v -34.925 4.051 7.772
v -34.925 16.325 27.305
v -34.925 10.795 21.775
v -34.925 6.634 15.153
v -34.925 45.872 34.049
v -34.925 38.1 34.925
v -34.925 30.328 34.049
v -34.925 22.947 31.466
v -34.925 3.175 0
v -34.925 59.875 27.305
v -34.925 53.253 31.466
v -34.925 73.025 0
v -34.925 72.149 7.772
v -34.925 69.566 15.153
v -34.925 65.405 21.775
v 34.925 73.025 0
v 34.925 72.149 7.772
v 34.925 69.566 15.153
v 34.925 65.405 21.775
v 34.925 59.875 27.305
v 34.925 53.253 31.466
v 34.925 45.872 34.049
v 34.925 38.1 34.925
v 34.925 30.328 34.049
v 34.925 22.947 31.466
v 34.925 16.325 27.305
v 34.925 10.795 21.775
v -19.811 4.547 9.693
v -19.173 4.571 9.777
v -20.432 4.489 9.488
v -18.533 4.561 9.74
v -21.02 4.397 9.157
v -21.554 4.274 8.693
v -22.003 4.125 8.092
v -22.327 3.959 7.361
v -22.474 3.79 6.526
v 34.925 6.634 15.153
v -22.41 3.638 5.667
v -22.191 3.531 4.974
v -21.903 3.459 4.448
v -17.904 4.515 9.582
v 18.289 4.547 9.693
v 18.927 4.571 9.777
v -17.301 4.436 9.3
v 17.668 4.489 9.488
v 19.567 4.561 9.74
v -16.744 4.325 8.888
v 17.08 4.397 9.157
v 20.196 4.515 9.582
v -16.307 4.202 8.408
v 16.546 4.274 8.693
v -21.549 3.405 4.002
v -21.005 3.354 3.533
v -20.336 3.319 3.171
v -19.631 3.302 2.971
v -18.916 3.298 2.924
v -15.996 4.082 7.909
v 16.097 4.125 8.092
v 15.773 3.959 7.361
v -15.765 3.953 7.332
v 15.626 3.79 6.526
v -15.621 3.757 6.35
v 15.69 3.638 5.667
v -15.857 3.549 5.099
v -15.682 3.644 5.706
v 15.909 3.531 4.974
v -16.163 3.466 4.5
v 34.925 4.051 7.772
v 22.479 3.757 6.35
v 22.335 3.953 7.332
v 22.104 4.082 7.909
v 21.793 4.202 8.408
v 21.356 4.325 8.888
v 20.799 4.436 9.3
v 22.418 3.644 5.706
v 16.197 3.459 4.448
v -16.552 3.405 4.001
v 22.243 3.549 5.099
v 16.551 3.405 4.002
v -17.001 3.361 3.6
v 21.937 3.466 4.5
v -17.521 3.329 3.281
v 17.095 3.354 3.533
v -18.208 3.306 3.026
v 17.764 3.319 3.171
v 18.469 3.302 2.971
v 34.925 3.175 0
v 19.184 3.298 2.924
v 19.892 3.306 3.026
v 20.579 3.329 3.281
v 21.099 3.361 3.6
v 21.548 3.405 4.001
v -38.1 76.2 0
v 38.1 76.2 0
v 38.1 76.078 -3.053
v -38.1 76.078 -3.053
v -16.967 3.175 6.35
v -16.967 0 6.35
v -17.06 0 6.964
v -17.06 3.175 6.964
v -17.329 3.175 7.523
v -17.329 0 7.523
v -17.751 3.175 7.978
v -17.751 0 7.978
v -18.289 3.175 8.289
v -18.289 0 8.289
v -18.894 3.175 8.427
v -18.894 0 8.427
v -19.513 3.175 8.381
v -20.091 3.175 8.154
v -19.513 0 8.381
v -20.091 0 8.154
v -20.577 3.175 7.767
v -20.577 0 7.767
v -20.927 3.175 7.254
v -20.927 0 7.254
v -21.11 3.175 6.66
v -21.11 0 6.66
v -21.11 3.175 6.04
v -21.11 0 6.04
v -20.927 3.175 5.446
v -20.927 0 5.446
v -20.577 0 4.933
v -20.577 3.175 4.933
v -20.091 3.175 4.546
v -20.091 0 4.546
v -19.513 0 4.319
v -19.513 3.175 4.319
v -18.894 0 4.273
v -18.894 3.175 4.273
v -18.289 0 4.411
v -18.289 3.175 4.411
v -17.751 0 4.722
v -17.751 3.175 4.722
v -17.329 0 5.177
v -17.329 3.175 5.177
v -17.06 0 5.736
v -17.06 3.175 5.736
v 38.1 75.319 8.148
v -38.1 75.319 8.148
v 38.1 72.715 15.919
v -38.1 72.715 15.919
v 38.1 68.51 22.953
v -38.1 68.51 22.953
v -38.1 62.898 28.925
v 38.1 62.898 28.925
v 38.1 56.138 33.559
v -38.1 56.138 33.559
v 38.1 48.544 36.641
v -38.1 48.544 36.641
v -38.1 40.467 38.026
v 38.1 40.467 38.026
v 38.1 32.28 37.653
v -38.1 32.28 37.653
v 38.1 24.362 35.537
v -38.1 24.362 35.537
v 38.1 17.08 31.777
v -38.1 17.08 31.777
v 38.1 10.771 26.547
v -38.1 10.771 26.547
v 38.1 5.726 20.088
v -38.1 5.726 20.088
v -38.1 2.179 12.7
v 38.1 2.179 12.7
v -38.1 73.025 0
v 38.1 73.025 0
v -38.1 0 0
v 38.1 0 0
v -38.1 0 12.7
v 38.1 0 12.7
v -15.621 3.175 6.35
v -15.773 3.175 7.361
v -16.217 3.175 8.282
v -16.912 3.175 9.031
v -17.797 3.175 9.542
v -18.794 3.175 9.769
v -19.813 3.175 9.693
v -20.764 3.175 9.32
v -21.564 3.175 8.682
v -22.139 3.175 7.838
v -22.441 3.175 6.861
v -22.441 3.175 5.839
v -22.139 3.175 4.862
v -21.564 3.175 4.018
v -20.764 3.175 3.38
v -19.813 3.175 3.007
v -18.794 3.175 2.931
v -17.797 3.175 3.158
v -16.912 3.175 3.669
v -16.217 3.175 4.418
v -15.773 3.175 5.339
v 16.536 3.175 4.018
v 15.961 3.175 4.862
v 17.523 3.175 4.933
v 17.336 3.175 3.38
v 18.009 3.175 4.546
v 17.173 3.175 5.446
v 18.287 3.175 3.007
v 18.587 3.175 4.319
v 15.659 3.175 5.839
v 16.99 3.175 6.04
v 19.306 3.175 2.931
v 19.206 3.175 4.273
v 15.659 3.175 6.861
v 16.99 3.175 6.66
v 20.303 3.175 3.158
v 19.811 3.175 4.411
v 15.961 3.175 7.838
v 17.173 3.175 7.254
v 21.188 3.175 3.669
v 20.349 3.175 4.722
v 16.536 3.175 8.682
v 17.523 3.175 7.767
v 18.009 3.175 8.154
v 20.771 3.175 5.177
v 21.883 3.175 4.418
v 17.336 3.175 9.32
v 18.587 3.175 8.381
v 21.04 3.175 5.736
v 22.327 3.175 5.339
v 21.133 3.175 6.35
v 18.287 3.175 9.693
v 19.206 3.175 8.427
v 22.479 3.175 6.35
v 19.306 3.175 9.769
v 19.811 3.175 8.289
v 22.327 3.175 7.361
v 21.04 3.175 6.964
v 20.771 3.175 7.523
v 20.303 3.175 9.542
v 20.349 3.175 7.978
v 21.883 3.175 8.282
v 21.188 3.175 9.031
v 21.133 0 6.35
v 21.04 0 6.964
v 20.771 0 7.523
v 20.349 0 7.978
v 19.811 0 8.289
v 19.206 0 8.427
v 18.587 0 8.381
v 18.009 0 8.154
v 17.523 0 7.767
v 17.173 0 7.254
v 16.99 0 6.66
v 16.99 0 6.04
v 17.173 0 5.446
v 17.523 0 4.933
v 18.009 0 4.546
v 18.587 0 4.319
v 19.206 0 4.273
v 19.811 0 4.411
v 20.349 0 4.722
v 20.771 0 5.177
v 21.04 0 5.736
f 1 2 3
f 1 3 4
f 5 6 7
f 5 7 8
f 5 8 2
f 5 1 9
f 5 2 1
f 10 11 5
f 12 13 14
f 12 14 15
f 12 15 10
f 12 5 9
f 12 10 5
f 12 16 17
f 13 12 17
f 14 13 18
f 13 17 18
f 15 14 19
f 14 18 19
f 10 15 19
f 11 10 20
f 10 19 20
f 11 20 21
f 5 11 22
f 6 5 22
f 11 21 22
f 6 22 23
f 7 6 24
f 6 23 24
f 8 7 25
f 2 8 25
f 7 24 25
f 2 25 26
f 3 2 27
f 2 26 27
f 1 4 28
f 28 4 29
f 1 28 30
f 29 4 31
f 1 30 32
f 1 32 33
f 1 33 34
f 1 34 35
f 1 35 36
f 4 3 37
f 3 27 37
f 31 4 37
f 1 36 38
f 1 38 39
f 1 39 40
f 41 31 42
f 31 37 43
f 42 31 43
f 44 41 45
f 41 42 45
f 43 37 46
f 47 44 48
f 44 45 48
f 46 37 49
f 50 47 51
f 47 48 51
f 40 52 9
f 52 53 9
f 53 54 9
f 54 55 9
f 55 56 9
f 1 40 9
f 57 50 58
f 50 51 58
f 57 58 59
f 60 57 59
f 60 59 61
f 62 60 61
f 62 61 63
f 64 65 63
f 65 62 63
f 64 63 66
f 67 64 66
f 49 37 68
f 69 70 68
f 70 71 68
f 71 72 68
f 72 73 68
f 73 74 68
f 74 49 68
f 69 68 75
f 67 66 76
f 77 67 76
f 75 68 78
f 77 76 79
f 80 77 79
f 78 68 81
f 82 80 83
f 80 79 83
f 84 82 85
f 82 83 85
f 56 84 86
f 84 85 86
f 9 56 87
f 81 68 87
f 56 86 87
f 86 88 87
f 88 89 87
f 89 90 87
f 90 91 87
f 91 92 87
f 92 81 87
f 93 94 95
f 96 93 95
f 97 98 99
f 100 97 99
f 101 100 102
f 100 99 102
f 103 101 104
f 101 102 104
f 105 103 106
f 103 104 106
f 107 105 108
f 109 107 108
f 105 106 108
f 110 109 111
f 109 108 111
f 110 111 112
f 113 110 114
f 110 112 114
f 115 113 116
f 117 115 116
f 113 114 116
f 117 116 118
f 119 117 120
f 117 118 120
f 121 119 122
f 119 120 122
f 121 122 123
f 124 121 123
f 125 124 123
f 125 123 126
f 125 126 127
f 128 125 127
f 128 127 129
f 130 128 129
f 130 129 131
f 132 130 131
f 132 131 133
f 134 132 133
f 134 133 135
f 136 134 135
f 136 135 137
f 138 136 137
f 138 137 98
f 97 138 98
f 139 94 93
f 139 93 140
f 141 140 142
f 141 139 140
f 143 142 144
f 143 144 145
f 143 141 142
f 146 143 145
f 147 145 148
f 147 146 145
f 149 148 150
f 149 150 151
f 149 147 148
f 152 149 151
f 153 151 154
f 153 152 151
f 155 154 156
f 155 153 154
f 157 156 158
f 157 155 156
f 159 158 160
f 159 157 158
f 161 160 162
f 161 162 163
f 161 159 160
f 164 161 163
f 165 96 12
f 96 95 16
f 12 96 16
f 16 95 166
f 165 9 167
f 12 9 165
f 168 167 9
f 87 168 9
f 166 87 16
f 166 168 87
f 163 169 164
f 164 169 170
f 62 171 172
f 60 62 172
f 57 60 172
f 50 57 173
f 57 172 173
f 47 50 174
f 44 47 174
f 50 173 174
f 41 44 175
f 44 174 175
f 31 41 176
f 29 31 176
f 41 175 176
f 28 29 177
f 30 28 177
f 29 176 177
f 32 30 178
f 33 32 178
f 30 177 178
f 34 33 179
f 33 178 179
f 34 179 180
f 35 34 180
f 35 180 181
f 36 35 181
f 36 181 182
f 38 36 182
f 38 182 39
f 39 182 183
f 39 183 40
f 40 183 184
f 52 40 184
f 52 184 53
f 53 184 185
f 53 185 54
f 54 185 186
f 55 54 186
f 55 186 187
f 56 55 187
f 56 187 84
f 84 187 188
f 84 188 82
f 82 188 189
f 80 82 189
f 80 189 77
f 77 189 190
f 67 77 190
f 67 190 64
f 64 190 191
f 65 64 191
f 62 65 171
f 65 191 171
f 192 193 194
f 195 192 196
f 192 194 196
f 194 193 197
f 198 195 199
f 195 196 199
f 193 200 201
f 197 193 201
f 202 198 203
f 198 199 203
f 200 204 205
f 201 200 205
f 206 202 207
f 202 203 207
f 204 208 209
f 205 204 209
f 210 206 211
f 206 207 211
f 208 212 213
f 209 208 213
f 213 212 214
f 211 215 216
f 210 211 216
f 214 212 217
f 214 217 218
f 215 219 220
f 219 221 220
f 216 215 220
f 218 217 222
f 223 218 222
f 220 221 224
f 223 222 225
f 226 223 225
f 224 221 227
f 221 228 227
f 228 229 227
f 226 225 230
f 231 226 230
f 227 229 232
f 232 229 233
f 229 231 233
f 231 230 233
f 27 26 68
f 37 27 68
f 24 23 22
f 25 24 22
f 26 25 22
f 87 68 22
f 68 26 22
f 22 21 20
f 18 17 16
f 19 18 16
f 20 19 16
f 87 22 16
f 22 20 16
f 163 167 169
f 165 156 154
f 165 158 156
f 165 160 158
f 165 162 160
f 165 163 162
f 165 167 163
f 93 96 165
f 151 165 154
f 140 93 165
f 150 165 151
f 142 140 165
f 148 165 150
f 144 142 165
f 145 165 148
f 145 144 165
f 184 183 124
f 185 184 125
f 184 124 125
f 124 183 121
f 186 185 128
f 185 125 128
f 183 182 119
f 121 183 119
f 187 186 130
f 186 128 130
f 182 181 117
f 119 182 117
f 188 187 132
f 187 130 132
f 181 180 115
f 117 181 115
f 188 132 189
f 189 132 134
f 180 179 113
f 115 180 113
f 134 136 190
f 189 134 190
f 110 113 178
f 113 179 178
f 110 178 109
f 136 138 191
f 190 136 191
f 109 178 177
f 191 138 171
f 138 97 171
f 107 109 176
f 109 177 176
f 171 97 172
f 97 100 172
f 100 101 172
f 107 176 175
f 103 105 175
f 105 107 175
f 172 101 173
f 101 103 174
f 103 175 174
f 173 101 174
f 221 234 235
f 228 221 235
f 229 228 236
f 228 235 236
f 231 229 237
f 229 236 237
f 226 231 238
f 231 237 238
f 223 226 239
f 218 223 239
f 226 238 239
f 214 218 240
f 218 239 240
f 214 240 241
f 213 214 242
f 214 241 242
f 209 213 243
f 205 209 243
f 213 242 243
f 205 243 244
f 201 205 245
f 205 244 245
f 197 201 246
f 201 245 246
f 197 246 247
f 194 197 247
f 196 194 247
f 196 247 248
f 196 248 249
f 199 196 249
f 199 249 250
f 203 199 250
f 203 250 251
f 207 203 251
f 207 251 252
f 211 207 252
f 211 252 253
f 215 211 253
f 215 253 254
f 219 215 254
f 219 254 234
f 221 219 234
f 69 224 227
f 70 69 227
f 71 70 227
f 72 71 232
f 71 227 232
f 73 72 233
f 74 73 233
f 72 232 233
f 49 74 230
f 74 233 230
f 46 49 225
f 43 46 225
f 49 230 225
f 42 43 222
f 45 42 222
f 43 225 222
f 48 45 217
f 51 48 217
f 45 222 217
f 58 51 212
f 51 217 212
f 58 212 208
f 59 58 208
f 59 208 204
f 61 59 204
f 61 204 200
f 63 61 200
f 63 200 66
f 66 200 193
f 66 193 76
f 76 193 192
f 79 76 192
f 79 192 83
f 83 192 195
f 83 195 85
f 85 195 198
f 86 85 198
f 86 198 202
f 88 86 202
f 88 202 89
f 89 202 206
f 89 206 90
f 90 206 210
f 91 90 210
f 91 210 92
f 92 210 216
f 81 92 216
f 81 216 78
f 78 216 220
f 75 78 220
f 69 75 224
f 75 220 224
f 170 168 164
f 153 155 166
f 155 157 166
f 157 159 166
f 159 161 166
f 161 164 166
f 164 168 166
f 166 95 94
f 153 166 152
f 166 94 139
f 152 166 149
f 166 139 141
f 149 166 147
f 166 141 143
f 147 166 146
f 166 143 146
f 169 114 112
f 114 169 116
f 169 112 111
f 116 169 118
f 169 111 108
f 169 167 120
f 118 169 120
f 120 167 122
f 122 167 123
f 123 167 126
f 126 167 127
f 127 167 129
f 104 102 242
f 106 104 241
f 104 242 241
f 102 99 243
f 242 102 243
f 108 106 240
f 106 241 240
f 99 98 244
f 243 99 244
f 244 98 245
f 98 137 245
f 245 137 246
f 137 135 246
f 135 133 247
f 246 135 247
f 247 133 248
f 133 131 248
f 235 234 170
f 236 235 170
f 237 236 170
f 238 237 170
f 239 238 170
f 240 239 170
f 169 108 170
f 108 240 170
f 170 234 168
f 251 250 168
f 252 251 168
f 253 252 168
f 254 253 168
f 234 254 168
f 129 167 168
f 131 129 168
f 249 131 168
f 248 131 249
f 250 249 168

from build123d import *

# Parameters (mm, degrees)
BOSS_EXTRUDE1_DEPTH = 38.1
SHELL1_T            = -3.175
SKETCH7_W           = 76.2
SKETCH7_H           = 3.175
BOSS_EXTRUDE2_DEPTH = 12.7
BOSS_EXTRUDE3_DEPTH = 76.2
CUT_EXTRUDE3_REACH  = 78.2
SKETCH10_R          = 2.0828
CUT_EXTRUDE4_REACH  = 81.375
CUT_EXTRUDE4_START  = -3.175
SKETCH11_R          = 3.429


with BuildPart() as part:
    # Sketch2 → Boss-Extrude1 (new body, symmetric)
    with BuildSketch(Plane(origin=(0, 0, 0), x_dir=(0, 0, -1), z_dir=(1, 0, 0))):
        with BuildLine():
            Line((0, 0), (0, 38.1))
            Line((0, 38.1), (0, 76.2))
            ThreePointArc((0, 76.2), (-38.1, 38.1), (0, 0))
        make_face()
    extrude(amount=BOSS_EXTRUDE1_DEPTH, both=True)

    # Shell1
    shell1_openings = [part.faces().sort_by_distance(p)[0] for p in [
        (0, 38.1, 0),
    ]]
    offset(amount=SHELL1_T, openings=shell1_openings)

    # Sketch7 → Boss-Extrude2 (add)
    with BuildSketch(Plane(origin=(0, 0, 0), x_dir=(1, 0, 0), z_dir=(0, 0, -1))):
        with Locations((0, -1.5875)):
            Rectangle(SKETCH7_W, SKETCH7_H)
    extrude(amount=-BOSS_EXTRUDE2_DEPTH)

    # Sketch8 → Boss-Extrude3 (add)
    with BuildSketch(Plane(origin=(38.1, 0, 0), x_dir=(0, 0, -1), z_dir=(1, 0, 0))):
        Polygon((0, 73.025), (0, 76.2), (3.052521174, 76.077521174), align=None)
    extrude(amount=-BOSS_EXTRUDE3_DEPTH)

    # Sketch10 → Cut-Extrude3 (cut, up to next)
    with BuildSketch(Plane.XZ, mode=Mode.PRIVATE) as cut_extrude3_sk1:
        with Locations((19.05, 6.35)):
            Circle(SKETCH10_R)
    cut_extrude3_tool1 = extrude(cut_extrude3_sk1.sketch, amount=-CUT_EXTRUDE3_REACH, mode=Mode.PRIVATE) & part.part
    add(cut_extrude3_tool1.solids().sort_by_distance((19.05, 0, 6.35))[0], mode=Mode.SUBTRACT)
    # Sketch10 → Cut-Extrude3 (cut, up to next)
    with BuildSketch(Plane.XZ, mode=Mode.PRIVATE) as cut_extrude3_sk2:
        with Locations((-19.05, 6.35)):
            Circle(SKETCH10_R)
    cut_extrude3_tool2 = extrude(cut_extrude3_sk2.sketch, amount=-CUT_EXTRUDE3_REACH, mode=Mode.PRIVATE) & part.part
    add(cut_extrude3_tool2.solids().sort_by_distance((-19.05, 0, 6.35))[0], mode=Mode.SUBTRACT)

    # Sketch11 → Cut-Extrude4 (cut, up to next)
    with BuildSketch(Plane.XZ.offset(CUT_EXTRUDE4_START), mode=Mode.PRIVATE) as cut_extrude4_sk1:
        with Locations((19.05, 6.35)):
            Circle(SKETCH11_R)
    cut_extrude4_tool1 = extrude(cut_extrude4_sk1.sketch, amount=-CUT_EXTRUDE4_REACH, mode=Mode.PRIVATE) & part.part
    add(cut_extrude4_tool1.solids().sort_by_distance((19.05, 3.175, 6.35))[0], mode=Mode.SUBTRACT)
    # Sketch11 → Cut-Extrude4 (cut, up to next)
    with BuildSketch(Plane.XZ.offset(CUT_EXTRUDE4_START), mode=Mode.PRIVATE) as cut_extrude4_sk2:
        with Locations((-19.05, 6.35)):
            Circle(SKETCH11_R)
    cut_extrude4_tool2 = extrude(cut_extrude4_sk2.sketch, amount=-CUT_EXTRUDE4_REACH, mode=Mode.PRIVATE) & part.part
    add(cut_extrude4_tool2.solids().sort_by_distance((-19.05, 3.175, 6.35))[0], mode=Mode.SUBTRACT)


solid = part.part
